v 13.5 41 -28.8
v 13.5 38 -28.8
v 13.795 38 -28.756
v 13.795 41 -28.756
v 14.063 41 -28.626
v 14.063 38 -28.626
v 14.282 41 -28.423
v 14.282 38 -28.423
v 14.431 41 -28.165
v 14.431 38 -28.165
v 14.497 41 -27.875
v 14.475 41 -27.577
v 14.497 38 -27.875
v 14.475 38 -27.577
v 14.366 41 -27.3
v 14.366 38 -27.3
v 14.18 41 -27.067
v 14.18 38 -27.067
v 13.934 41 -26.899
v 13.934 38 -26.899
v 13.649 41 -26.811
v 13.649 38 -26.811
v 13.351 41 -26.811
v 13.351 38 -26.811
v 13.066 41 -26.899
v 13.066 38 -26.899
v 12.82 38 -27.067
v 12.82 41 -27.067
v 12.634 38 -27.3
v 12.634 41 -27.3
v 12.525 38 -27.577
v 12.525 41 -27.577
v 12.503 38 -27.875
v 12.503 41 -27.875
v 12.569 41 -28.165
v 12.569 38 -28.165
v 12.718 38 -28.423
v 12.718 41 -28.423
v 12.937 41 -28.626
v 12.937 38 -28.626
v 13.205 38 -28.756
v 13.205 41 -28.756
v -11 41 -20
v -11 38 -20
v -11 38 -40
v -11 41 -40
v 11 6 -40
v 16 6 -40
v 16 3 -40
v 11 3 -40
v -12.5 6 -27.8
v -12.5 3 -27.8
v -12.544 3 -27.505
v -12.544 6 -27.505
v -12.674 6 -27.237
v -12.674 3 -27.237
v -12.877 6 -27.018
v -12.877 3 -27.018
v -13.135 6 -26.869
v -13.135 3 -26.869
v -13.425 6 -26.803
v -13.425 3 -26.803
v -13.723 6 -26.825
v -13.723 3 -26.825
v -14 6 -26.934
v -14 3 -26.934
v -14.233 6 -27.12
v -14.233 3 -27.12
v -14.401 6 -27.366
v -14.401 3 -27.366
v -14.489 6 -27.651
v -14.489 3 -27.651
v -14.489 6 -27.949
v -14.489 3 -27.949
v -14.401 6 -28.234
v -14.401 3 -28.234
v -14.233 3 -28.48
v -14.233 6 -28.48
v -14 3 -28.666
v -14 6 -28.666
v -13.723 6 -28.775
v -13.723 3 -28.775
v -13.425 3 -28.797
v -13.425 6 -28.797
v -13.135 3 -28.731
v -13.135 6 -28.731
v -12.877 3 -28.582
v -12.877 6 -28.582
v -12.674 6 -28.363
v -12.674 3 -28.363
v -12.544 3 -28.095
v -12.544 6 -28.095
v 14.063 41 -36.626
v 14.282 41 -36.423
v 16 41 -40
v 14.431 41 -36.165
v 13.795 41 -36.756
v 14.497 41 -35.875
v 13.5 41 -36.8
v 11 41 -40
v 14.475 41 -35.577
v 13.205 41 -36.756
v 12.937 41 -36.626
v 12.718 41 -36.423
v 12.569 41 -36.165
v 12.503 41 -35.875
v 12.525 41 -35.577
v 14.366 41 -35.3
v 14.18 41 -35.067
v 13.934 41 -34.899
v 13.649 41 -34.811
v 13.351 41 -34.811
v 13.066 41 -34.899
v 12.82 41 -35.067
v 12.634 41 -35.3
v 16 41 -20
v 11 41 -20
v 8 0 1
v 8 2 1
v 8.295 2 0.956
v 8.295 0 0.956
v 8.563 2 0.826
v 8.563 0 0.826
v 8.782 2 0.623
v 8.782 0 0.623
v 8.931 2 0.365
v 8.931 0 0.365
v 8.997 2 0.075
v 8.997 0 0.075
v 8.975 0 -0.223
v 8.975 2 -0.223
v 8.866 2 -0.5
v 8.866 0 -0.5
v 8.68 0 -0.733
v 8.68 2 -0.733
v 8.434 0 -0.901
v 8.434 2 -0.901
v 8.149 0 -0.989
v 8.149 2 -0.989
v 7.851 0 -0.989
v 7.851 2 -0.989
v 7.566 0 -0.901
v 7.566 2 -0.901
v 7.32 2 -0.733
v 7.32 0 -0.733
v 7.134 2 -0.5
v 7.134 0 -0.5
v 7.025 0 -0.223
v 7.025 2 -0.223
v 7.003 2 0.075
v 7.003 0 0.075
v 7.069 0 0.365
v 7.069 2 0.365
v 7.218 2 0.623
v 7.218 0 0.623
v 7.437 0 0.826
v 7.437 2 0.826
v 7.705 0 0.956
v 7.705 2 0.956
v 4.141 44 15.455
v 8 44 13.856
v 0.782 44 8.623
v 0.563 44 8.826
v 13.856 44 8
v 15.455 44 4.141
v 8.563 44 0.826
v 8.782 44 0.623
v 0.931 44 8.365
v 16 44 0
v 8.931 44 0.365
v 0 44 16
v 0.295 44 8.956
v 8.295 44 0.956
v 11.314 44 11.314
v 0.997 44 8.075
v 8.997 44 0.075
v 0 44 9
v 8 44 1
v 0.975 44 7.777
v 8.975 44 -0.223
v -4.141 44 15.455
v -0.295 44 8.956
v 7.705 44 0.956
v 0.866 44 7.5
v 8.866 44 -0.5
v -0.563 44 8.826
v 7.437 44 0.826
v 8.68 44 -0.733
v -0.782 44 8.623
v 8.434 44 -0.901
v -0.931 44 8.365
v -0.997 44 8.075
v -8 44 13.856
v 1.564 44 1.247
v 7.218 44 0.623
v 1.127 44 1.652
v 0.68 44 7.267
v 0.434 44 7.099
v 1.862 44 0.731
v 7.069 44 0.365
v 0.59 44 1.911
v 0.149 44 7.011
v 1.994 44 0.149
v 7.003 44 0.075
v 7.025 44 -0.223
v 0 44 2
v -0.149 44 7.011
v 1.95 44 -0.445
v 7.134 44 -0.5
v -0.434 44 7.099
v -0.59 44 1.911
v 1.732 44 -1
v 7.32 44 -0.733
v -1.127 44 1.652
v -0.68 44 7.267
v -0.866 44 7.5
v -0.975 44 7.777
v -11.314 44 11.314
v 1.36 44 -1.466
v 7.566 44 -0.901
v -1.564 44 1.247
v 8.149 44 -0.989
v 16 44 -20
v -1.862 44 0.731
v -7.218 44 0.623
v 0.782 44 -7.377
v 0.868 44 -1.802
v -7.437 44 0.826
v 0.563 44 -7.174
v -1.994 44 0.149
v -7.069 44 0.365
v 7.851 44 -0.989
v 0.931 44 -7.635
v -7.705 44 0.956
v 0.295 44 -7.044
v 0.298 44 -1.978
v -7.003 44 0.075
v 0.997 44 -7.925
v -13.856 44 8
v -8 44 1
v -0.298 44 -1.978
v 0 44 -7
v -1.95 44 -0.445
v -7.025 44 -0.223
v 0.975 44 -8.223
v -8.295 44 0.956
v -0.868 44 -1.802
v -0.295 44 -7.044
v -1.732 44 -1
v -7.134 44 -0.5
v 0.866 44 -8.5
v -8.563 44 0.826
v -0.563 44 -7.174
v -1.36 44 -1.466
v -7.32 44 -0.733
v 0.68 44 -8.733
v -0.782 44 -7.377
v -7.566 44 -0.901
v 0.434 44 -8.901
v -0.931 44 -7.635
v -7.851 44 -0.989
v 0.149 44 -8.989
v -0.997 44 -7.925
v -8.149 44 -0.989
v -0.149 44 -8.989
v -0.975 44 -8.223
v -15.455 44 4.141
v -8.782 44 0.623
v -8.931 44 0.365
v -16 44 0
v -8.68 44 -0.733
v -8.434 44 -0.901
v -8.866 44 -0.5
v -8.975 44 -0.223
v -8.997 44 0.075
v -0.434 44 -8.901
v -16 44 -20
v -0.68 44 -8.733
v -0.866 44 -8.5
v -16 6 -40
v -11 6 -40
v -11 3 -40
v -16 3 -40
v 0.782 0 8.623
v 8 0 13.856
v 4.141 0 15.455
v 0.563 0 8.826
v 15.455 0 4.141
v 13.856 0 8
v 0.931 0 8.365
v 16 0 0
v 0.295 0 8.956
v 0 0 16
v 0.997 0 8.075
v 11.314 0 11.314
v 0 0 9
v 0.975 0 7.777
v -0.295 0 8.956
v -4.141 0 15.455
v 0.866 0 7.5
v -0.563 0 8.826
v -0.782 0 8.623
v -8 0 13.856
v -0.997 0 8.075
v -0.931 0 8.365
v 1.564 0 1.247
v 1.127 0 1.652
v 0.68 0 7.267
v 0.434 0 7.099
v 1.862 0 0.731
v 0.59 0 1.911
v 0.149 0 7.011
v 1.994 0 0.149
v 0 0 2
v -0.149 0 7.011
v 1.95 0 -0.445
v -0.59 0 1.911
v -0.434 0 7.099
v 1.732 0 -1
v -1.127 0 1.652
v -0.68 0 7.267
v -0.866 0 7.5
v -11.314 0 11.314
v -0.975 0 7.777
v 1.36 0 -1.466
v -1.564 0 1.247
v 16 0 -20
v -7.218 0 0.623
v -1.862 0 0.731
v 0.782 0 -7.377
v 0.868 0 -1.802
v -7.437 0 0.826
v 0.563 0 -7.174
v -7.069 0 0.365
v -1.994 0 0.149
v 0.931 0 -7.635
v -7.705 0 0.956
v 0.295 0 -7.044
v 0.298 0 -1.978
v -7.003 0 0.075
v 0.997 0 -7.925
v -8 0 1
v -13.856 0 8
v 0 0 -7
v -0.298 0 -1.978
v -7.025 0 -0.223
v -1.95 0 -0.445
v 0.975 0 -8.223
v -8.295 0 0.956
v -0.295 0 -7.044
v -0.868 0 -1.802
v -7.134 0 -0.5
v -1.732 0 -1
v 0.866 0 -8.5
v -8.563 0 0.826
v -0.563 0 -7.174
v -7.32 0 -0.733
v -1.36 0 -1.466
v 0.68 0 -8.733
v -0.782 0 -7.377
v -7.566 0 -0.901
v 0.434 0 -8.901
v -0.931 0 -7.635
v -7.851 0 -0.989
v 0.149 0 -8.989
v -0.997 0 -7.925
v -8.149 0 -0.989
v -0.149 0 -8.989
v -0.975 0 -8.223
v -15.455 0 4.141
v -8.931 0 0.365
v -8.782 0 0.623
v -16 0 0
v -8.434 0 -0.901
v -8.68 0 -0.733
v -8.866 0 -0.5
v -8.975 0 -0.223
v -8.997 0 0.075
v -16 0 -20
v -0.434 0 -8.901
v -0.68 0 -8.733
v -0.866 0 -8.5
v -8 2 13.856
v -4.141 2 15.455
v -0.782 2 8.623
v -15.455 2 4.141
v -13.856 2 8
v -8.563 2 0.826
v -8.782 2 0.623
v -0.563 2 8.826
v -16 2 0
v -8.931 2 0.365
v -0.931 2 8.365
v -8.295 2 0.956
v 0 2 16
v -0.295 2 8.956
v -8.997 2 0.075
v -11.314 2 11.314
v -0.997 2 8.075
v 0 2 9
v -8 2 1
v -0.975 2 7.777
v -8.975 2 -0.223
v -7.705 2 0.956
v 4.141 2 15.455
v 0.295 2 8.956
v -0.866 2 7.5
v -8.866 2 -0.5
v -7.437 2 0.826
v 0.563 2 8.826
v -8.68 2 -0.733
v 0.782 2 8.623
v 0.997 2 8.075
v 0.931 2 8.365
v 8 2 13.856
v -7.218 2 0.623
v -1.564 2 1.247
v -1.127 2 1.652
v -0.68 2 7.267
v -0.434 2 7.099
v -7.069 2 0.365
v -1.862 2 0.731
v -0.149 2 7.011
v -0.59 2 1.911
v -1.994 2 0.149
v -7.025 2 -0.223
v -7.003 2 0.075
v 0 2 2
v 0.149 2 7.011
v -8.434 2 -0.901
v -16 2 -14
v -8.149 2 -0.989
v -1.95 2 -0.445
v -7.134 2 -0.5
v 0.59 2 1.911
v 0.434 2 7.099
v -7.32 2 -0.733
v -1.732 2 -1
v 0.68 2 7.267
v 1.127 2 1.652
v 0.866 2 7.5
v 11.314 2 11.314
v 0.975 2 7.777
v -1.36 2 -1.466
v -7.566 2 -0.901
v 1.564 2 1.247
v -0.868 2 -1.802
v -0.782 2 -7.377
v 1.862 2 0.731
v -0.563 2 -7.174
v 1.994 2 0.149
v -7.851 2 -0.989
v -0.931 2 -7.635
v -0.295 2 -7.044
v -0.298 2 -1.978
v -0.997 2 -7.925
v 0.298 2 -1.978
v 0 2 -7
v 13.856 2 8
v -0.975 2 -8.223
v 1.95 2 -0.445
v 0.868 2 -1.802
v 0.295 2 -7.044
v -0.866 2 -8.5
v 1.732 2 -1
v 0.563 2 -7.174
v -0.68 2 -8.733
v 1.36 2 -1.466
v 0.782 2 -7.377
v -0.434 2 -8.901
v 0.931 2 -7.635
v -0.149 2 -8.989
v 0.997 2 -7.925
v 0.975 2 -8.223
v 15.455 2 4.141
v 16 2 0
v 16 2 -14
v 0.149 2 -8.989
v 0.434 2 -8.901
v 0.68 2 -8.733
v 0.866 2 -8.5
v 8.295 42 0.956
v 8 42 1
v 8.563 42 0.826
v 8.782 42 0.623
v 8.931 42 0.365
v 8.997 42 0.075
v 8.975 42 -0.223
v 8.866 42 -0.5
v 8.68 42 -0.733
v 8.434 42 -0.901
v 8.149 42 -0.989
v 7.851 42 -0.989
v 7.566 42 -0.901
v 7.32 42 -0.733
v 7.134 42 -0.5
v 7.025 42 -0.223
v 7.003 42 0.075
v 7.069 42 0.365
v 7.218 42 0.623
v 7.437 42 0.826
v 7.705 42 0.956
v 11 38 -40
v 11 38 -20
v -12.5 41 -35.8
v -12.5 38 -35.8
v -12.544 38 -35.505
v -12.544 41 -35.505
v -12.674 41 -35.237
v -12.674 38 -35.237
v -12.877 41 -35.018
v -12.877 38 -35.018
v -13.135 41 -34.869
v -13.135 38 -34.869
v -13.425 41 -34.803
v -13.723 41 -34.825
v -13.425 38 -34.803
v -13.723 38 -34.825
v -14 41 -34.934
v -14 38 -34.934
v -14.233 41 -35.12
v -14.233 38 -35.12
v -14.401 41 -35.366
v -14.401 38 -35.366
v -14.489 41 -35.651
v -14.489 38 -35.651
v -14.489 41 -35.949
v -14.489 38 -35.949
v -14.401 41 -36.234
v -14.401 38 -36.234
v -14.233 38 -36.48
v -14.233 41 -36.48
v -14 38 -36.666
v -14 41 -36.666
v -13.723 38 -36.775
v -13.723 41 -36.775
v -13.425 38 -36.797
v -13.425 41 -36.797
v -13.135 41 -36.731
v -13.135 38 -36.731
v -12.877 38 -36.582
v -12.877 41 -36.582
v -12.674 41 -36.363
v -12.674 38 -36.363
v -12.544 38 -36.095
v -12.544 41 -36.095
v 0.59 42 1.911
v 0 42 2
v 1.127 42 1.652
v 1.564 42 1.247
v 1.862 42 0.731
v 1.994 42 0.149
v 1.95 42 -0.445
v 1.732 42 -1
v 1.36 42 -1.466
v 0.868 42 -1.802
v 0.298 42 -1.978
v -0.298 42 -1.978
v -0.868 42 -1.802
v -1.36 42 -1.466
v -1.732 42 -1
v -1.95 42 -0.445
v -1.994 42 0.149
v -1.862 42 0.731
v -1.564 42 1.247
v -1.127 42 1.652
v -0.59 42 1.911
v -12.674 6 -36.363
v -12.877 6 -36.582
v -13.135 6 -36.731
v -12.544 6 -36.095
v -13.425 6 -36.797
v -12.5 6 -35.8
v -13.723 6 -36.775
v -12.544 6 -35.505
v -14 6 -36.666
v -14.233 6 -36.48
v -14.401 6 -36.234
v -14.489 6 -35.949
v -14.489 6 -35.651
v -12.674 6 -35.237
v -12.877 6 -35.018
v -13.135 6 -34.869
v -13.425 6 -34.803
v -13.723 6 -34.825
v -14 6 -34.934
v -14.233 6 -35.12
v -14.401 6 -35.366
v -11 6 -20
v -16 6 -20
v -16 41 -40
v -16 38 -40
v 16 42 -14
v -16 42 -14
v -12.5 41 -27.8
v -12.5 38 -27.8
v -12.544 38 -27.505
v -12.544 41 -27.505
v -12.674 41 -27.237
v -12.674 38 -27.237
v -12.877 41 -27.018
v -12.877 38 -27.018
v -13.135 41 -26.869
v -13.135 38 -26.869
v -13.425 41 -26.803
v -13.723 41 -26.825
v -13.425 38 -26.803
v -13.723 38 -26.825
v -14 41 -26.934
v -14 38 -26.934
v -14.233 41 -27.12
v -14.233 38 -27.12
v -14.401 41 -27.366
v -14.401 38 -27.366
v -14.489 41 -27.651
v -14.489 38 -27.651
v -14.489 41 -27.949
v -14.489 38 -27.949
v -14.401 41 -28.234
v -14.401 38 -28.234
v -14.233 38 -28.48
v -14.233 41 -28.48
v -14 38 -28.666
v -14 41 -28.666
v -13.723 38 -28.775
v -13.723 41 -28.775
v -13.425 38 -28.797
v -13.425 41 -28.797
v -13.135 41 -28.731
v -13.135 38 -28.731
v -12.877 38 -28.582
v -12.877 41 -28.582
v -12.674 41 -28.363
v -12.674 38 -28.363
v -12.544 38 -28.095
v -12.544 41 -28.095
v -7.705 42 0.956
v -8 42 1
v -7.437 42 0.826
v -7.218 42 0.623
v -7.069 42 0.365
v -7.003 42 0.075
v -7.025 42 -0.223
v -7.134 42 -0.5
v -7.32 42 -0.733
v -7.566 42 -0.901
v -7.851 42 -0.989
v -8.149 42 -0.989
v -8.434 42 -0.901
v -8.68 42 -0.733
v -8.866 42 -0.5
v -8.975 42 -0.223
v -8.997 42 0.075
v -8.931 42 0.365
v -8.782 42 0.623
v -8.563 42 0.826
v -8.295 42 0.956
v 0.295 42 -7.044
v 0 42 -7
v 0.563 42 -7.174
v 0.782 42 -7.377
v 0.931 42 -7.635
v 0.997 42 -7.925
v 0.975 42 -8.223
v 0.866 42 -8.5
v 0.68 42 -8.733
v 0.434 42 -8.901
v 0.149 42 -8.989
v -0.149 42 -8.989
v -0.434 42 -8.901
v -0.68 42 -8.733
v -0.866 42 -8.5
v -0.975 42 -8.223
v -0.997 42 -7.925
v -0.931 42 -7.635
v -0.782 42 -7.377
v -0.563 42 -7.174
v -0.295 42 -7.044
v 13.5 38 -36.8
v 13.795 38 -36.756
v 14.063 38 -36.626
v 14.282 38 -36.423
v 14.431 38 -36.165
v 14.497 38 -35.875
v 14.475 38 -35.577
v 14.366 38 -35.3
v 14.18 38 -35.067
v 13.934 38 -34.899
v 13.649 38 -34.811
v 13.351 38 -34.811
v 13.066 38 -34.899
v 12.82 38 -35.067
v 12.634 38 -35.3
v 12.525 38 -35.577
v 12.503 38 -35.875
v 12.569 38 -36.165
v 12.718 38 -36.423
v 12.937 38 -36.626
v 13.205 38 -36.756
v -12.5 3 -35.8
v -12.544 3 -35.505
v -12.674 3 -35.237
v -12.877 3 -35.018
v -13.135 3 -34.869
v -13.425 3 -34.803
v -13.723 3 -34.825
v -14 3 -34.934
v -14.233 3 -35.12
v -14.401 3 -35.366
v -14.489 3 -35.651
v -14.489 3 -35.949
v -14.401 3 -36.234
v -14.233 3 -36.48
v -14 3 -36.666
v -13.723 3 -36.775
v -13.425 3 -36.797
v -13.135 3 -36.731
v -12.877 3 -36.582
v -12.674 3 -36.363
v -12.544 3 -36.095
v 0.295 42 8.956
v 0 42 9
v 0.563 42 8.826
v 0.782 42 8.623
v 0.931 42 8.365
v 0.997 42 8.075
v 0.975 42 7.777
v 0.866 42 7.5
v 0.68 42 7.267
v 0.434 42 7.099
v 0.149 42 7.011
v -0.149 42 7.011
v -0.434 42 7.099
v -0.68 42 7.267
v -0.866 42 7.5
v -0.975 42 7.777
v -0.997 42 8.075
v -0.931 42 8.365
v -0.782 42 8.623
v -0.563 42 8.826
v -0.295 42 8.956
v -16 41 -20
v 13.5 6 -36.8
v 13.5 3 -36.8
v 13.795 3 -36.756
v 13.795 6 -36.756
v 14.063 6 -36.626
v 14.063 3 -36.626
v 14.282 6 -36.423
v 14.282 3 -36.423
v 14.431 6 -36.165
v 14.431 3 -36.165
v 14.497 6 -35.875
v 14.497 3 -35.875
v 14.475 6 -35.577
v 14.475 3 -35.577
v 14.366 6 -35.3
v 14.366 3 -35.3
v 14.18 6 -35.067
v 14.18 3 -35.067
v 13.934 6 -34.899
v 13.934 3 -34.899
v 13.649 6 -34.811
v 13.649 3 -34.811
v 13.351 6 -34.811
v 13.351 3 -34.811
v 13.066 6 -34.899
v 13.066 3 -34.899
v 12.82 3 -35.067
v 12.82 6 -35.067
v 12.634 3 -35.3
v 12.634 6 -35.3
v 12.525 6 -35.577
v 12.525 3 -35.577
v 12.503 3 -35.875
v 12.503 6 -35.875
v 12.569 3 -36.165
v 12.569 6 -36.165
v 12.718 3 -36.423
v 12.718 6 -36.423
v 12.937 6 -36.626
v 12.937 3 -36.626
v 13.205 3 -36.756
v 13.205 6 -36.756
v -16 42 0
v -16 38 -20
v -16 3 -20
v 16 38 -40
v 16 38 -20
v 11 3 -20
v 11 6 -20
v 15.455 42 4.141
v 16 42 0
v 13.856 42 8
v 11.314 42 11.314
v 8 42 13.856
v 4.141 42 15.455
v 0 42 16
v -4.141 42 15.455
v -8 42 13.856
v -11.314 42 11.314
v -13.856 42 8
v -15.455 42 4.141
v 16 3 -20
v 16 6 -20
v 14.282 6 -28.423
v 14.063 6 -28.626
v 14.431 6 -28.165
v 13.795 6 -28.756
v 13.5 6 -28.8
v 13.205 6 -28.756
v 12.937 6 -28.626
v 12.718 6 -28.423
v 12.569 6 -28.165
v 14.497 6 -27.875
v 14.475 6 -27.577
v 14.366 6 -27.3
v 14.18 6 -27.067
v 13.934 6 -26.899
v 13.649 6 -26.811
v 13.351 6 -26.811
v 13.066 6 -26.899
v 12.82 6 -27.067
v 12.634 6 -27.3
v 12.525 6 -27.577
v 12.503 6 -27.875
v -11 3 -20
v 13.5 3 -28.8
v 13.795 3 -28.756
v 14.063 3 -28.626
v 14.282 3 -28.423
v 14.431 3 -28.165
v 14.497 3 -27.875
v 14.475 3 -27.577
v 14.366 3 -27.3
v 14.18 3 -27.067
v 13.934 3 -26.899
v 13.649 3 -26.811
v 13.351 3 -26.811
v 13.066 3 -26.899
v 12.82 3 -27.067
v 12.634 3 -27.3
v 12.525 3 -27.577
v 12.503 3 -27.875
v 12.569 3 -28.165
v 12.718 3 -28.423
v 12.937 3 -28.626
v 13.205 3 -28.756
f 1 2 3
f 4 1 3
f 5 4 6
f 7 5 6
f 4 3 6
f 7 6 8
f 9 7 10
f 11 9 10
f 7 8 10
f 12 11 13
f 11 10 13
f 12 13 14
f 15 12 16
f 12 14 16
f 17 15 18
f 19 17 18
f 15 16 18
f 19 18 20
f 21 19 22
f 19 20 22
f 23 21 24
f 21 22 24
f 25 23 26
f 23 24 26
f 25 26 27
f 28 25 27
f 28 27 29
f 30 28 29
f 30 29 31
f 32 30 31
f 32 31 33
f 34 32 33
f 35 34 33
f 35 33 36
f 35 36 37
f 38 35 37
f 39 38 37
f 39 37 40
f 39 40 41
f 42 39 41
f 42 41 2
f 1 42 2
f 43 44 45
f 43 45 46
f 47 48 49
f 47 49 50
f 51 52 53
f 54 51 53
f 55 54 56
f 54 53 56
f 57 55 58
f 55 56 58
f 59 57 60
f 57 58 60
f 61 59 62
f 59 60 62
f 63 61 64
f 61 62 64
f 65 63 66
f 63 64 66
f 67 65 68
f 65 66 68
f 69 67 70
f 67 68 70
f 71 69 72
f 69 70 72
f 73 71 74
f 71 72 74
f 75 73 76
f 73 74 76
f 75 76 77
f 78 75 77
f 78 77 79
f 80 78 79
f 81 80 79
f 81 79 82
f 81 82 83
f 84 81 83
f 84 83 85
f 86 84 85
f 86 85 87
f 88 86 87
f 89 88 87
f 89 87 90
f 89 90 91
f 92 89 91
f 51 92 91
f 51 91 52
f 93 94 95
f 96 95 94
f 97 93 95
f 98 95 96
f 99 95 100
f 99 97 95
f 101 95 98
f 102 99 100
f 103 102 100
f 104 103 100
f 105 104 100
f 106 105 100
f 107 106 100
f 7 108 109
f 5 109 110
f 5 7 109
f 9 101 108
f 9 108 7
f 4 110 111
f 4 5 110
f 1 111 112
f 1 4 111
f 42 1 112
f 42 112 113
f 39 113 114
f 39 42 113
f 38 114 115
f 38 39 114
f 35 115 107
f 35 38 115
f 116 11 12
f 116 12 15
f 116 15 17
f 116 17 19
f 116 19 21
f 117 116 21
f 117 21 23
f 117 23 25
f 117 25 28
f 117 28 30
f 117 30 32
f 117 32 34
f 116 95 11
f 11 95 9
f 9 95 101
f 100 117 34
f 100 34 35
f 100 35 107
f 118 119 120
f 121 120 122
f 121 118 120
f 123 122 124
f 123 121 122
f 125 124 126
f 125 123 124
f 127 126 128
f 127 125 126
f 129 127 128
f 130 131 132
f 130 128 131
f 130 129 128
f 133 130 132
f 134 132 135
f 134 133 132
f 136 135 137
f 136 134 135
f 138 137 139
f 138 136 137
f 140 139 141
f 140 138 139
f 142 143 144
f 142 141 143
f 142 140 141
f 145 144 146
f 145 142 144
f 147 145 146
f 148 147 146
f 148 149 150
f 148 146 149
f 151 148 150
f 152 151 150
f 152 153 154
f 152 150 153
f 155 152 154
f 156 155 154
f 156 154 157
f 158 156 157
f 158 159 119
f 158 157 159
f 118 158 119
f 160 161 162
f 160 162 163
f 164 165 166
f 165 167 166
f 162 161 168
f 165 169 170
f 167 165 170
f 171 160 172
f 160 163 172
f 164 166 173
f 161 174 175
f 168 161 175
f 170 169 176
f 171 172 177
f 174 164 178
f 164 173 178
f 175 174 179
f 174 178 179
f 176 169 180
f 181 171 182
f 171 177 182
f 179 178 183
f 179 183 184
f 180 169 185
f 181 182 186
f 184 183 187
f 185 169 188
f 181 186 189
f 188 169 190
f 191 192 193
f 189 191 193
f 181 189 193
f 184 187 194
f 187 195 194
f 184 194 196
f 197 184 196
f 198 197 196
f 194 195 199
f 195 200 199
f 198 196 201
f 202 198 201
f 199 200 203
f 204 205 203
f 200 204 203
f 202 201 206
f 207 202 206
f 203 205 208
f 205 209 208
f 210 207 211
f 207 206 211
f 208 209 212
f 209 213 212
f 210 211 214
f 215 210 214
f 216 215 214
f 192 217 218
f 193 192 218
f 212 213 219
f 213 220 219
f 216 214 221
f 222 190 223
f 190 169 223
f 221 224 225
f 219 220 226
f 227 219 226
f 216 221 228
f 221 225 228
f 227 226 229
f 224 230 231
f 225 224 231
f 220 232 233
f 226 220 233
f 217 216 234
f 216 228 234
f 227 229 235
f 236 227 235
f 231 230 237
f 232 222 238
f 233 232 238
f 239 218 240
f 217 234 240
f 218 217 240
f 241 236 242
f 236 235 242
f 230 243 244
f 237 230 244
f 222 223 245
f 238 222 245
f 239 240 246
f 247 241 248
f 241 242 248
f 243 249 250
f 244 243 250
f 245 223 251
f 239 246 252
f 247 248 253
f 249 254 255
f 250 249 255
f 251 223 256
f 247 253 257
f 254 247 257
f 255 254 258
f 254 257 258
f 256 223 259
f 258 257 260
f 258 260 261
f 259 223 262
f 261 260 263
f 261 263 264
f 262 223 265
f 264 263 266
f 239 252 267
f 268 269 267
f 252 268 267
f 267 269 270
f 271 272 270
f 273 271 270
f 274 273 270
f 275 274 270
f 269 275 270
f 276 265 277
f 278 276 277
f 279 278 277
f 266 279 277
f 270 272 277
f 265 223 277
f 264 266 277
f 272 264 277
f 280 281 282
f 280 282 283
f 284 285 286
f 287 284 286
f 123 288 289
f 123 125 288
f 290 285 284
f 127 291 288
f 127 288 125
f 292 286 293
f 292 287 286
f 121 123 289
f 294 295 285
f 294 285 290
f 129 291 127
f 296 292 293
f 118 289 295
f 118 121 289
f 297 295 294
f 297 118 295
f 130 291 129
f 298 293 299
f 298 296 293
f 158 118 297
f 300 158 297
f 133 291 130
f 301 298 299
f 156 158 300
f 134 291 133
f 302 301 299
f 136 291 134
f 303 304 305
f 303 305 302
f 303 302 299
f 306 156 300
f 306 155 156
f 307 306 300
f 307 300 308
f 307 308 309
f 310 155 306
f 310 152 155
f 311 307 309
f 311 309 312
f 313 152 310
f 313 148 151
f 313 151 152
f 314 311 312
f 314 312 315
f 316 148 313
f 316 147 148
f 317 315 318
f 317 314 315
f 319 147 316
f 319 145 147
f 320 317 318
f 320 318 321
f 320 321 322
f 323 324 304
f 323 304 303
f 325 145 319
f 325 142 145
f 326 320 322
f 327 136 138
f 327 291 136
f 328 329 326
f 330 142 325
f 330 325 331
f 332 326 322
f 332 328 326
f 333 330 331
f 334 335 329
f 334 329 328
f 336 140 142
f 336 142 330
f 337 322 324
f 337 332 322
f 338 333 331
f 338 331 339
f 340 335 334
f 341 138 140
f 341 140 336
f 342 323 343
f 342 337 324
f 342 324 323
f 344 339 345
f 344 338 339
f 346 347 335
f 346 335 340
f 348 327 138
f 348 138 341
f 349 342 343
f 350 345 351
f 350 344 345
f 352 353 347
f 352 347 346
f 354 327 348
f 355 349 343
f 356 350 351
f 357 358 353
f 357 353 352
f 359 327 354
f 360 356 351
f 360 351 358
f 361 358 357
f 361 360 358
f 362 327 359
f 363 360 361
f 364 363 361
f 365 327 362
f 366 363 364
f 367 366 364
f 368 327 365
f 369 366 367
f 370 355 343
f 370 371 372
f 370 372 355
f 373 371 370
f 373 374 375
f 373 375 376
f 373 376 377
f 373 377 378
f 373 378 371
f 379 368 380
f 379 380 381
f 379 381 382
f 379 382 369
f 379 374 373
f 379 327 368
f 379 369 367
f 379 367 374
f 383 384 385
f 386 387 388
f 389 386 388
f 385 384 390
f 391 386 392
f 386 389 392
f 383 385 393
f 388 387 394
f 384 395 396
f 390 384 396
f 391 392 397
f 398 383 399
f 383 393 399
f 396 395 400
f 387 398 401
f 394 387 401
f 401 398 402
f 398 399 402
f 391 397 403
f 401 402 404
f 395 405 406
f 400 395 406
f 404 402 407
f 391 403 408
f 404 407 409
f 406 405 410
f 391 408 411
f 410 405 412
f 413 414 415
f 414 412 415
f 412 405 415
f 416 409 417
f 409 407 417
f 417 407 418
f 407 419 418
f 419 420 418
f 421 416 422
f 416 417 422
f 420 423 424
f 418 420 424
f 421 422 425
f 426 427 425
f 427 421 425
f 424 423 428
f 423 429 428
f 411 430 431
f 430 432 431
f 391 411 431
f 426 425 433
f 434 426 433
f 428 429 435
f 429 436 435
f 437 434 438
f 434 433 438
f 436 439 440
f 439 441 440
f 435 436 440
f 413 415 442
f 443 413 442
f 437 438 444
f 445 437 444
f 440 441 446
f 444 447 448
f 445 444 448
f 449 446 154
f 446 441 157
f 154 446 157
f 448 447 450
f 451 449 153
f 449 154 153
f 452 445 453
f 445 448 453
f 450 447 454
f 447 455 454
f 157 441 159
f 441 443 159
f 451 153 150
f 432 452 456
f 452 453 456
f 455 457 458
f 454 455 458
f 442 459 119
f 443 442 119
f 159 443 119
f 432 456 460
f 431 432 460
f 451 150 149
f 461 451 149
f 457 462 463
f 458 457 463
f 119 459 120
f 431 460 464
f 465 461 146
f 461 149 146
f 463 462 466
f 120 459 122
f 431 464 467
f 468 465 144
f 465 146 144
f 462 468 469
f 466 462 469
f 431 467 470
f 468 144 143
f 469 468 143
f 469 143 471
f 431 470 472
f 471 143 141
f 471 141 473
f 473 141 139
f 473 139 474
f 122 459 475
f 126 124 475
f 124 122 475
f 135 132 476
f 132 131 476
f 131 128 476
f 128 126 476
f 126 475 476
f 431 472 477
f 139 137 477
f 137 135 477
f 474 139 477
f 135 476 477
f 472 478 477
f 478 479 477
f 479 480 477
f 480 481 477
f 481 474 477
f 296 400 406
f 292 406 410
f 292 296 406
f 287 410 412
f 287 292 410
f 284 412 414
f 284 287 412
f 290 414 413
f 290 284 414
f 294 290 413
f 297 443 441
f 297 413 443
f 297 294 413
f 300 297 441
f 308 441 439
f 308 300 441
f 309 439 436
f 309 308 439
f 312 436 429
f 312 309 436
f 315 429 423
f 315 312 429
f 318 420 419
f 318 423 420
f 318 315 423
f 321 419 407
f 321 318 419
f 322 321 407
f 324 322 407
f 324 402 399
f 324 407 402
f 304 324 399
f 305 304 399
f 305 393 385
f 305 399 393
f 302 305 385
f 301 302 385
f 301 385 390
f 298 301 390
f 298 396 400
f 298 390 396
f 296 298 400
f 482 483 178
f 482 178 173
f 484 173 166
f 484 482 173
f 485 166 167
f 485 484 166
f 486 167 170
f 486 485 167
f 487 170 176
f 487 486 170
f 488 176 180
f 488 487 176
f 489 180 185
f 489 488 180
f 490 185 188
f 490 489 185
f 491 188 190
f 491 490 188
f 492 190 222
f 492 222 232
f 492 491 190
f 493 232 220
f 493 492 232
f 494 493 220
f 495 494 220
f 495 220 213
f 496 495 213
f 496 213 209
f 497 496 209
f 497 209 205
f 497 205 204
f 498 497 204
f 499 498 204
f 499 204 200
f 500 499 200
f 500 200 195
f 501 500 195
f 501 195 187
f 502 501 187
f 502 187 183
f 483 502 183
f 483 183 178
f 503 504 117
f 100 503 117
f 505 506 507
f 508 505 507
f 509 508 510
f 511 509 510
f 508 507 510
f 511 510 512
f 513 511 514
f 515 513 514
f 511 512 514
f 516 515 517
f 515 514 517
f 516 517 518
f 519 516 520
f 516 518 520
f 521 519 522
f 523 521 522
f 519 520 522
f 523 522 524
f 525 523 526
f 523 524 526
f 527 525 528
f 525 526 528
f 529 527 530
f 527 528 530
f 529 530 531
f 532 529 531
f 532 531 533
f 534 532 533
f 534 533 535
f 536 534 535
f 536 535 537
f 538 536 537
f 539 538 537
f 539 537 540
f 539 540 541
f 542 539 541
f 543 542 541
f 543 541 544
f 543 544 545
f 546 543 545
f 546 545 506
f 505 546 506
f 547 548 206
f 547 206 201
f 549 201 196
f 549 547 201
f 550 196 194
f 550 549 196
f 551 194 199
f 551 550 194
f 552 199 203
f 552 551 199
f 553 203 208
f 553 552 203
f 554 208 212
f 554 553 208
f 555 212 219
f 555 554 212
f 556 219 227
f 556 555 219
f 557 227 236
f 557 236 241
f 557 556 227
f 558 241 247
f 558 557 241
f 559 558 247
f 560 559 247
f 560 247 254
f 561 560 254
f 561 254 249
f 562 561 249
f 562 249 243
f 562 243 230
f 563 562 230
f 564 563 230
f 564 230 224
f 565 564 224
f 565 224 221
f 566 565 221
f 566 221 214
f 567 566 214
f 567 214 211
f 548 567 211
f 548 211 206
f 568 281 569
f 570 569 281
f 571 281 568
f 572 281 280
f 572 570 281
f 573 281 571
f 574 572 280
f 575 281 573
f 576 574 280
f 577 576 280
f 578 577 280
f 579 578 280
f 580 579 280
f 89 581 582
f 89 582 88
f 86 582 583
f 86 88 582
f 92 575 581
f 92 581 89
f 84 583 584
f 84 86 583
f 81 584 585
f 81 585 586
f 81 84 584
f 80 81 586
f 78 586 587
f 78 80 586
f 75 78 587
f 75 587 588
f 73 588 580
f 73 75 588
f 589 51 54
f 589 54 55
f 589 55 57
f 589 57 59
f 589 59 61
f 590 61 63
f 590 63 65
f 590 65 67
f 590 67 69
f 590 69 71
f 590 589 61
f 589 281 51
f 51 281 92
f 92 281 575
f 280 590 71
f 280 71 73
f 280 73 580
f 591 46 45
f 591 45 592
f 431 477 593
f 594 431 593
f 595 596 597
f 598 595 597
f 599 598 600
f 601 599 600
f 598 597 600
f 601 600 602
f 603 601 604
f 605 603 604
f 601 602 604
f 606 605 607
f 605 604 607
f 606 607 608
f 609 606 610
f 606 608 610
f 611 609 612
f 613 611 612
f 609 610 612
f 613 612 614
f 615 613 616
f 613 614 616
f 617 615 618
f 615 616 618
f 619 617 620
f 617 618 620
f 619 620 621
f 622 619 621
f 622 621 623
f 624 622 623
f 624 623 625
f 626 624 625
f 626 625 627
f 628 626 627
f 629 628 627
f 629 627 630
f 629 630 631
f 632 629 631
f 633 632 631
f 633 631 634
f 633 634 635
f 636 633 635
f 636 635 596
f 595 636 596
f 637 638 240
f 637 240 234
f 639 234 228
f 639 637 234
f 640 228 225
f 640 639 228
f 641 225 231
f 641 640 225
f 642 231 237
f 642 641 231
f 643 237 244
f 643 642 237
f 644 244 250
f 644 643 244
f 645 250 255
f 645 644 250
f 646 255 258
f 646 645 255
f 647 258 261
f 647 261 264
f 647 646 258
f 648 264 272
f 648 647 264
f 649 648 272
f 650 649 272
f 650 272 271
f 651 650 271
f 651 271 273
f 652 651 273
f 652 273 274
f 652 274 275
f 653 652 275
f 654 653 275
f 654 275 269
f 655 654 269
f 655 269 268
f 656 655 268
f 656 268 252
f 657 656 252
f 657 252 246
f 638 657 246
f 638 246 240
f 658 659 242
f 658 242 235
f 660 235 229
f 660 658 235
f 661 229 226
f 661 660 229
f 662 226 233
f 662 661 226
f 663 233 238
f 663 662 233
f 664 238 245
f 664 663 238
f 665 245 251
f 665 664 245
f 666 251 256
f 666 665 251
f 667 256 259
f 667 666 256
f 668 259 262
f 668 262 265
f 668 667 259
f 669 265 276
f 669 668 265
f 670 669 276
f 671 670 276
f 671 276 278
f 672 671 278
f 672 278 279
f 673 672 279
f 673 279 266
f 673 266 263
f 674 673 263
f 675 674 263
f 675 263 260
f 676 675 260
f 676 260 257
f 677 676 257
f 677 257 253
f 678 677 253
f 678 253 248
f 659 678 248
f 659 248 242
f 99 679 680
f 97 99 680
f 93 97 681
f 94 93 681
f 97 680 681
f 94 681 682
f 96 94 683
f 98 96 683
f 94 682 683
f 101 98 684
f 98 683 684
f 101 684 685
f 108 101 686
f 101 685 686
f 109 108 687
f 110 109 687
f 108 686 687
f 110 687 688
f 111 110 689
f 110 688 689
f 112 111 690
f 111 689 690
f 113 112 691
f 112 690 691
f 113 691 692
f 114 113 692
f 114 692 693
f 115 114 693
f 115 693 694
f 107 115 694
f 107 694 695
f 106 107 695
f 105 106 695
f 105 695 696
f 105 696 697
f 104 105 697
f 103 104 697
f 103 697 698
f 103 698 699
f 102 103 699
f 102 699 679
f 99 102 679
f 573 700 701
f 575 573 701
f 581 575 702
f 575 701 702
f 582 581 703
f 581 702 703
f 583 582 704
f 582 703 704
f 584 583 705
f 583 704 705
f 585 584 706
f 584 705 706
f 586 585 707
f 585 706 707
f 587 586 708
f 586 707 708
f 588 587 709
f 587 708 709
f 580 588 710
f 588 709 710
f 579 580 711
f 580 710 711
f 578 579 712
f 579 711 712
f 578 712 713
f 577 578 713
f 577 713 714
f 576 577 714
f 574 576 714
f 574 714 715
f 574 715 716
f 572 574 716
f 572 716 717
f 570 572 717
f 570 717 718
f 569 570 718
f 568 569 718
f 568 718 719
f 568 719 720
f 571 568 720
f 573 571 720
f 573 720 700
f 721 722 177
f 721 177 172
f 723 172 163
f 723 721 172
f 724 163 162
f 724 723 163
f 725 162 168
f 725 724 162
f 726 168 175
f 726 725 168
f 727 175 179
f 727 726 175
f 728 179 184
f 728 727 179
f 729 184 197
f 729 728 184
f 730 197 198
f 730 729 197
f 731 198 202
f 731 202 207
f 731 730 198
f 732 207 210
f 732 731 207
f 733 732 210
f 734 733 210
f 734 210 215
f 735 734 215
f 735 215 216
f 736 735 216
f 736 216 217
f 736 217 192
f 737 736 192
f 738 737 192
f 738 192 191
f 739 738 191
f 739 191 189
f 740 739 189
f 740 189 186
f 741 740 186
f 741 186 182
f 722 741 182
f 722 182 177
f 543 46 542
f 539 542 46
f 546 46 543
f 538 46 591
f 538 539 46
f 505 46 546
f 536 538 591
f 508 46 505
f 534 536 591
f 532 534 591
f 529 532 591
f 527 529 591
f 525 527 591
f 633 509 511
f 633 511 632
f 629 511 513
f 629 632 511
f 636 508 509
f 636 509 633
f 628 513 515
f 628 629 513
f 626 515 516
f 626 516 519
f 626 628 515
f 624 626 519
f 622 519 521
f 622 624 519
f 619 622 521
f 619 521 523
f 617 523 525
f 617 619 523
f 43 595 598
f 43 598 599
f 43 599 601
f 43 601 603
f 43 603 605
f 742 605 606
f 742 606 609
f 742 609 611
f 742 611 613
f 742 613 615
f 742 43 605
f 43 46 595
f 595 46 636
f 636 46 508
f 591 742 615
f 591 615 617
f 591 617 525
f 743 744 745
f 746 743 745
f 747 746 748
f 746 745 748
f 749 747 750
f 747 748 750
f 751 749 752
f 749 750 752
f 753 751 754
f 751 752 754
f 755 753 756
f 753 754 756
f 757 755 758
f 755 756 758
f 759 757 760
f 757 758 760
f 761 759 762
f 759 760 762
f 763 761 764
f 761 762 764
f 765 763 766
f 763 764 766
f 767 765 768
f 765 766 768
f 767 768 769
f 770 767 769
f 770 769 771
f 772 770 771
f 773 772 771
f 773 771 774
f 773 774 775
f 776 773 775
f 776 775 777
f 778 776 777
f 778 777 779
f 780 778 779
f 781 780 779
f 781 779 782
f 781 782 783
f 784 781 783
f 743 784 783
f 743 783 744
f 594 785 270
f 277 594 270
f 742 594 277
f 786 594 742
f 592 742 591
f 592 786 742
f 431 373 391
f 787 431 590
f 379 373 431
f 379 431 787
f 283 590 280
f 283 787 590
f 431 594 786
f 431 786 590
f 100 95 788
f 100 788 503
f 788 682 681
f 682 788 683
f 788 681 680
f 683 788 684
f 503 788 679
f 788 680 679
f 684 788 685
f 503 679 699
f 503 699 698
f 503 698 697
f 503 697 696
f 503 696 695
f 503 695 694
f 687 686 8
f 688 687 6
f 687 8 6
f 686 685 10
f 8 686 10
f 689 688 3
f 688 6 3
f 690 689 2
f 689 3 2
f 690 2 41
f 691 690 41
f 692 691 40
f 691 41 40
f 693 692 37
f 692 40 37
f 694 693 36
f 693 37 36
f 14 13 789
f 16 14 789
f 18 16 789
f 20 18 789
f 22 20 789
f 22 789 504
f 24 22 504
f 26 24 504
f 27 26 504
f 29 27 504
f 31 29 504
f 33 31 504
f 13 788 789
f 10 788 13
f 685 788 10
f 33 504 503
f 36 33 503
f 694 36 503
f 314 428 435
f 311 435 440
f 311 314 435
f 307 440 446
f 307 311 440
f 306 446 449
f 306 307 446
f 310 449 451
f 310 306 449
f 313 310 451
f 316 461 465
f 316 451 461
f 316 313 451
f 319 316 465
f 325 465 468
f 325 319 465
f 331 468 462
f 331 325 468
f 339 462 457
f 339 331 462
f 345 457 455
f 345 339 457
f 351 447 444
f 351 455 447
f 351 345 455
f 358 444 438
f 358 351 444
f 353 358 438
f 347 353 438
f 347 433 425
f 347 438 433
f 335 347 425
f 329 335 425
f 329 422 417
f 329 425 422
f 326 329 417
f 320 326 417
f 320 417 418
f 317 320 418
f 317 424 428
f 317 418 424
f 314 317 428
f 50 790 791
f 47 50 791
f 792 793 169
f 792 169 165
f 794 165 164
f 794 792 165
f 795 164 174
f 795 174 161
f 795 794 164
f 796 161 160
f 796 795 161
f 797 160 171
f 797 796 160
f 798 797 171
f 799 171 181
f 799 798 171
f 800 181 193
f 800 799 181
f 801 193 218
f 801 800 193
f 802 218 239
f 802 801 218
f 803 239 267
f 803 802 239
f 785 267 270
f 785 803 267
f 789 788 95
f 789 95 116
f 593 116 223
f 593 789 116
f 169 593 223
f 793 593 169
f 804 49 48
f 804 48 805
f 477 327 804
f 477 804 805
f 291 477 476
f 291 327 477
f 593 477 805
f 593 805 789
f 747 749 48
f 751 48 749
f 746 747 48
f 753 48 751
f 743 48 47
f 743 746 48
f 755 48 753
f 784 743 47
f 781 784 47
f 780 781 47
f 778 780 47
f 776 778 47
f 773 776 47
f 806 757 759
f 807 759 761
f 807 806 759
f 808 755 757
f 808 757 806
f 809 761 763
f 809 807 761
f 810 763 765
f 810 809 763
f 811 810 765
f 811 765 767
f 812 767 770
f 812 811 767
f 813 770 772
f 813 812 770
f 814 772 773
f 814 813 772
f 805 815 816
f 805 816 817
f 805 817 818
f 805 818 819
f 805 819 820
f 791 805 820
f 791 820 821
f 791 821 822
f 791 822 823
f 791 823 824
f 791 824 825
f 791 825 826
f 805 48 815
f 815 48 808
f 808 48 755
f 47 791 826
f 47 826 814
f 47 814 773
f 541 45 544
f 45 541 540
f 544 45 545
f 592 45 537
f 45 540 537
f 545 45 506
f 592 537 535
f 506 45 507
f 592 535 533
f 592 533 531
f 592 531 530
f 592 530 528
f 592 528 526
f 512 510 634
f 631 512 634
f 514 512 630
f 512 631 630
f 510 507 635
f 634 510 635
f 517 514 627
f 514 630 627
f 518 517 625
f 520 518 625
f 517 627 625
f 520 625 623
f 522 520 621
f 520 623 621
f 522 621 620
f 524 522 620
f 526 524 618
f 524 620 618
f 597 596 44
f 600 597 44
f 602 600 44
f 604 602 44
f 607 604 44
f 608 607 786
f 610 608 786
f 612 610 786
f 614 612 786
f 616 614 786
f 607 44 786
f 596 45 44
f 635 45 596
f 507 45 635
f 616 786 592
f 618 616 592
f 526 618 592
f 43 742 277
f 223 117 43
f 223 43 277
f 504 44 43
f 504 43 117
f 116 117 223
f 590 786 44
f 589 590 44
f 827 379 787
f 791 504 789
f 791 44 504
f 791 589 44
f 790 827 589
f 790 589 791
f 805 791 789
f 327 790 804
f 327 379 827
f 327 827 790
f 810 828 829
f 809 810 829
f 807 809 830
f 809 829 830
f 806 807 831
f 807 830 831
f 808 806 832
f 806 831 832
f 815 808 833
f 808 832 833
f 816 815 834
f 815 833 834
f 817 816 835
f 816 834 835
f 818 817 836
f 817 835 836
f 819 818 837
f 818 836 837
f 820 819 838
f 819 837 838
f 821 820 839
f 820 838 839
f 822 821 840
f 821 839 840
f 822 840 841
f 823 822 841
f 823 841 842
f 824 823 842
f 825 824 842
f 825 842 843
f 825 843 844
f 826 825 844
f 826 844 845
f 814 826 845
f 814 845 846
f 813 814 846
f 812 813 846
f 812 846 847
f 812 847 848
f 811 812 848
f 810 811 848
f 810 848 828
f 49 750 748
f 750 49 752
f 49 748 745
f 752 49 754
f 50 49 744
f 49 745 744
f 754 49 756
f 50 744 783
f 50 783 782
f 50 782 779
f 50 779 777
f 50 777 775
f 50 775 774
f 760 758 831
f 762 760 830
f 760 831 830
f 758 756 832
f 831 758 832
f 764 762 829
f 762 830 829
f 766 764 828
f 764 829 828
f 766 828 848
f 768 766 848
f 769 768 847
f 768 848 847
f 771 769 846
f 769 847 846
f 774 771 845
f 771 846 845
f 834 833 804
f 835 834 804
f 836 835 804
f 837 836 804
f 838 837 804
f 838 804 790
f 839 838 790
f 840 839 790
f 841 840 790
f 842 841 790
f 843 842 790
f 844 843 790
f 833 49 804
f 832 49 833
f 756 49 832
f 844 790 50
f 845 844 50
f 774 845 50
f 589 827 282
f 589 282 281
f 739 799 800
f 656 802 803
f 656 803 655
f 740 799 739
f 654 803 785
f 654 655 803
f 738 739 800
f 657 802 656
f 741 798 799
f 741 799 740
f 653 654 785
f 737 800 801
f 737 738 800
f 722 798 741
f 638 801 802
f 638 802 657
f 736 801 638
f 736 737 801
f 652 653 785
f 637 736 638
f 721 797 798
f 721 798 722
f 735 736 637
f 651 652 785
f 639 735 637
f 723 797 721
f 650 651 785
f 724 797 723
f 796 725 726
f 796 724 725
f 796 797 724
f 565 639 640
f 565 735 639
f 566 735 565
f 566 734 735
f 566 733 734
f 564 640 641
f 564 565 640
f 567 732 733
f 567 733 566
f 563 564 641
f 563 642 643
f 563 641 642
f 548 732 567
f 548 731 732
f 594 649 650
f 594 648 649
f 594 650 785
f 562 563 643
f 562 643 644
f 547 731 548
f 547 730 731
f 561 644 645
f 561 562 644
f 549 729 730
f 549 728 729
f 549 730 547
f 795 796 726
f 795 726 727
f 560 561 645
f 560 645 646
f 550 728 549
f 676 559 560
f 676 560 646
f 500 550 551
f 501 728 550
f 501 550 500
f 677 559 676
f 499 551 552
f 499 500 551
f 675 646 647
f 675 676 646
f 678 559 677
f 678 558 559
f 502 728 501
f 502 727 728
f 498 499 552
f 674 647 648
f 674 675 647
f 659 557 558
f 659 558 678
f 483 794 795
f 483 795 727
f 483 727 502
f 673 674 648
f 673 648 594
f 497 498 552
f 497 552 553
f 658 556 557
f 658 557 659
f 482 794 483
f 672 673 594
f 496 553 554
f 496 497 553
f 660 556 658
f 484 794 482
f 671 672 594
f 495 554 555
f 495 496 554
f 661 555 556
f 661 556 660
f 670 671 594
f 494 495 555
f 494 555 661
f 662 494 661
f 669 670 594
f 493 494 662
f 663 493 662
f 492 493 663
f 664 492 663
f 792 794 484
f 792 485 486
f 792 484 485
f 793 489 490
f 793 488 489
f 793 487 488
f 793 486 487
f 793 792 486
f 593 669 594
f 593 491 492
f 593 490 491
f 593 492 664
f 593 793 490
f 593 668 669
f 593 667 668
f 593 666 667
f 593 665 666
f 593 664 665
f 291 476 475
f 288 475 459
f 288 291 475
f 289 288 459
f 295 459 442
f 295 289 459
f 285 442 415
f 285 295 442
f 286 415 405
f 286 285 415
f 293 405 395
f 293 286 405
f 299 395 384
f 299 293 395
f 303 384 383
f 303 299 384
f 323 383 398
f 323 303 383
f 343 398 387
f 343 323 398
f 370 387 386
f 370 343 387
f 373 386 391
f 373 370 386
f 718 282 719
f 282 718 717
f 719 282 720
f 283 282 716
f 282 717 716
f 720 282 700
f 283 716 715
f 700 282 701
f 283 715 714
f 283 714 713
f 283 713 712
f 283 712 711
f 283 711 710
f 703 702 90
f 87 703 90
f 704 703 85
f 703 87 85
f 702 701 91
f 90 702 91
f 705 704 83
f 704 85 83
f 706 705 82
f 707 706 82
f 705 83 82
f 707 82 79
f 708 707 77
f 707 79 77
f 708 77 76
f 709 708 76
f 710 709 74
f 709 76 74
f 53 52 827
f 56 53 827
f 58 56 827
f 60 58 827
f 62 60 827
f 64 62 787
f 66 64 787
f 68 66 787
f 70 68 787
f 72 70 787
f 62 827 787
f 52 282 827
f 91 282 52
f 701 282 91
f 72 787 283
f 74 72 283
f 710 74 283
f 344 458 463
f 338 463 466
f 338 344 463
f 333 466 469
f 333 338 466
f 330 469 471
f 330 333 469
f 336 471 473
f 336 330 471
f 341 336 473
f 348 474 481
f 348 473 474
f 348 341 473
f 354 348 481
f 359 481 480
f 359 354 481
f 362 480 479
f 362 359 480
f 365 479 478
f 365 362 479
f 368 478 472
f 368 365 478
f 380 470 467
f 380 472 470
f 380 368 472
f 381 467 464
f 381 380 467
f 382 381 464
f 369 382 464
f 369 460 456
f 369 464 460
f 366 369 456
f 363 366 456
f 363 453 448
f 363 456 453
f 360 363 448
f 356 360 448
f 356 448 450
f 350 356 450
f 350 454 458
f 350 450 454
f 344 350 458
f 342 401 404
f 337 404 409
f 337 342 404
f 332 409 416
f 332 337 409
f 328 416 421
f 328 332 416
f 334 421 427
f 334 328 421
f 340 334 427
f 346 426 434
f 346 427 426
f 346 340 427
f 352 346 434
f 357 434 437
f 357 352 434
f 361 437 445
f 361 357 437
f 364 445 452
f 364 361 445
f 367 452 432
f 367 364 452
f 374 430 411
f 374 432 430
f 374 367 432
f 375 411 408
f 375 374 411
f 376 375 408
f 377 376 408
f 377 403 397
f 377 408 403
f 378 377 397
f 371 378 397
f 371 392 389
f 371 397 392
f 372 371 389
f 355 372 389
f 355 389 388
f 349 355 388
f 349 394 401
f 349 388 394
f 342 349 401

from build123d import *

# Parameters (mm, degrees)
SKETCH1_R           = 1
SKETCH1_R_2         = 2
BOSS_EXTRUDE1_DEPTH = 44
SKETCH2_W           = 30
SKETCH2_H           = 40
CUT_EXTRUDE1_DEPTH  = 58.965506985
SKETCH3_W           = 5
SKETCH3_H           = 3
BOSS_EXTRUDE2_DEPTH = 20
SKETCH4_R           = 1
CUT_EXTRUDE2_DEPTH  = 62.579217273


with BuildPart() as part:
    # Sketch1 → Boss-Extrude1 (new body)
    with BuildSketch(Plane(origin=(0, 0, 0), x_dir=(1, 0, 0), z_dir=(0, 1, 0))):
        with BuildLine():
            Line((-16, 0), (-16, 20))
            Line((-16, 20), (16, 20))
            Line((16, 20), (16, 0))
            ThreePointArc((16, 0), (0, -16), (-16, 0))
        make_face()
        with Locations(Location((0, 8, 0), (0, 0, 270))):
            Circle(SKETCH1_R, mode=Mode.SUBTRACT)
        with Locations(Location((8, 0, 0), (0, 0, 270))):
            Circle(SKETCH1_R, mode=Mode.SUBTRACT)
        with Locations(Location((0, -8, 0), (0, 0, 270))):
            Circle(SKETCH1_R, mode=Mode.SUBTRACT)
        with Locations(Location((-8, 0, 0), (0, 0, 270))):
            Circle(SKETCH1_R, mode=Mode.SUBTRACT)
        with Locations(Location((0, 0, 0), (0, 0, 270))):
            Circle(SKETCH1_R_2, mode=Mode.SUBTRACT)
    extrude(amount=BOSS_EXTRUDE1_DEPTH)

    # Sketch2 → Cut-Extrude1 (cut, through all)
    with BuildSketch(Plane(origin=(16, 0, 0), x_dir=(0, 0, -1), z_dir=(1, 0, 0))):
        with Locations((-1, 22)):
            Rectangle(SKETCH2_W, SKETCH2_H)
    extrude(amount=-CUT_EXTRUDE1_DEPTH, mode=Mode.SUBTRACT)

    # Sketch3 → Boss-Extrude2 (add)
    with BuildSketch(Plane(origin=(0, 0, -20), x_dir=(-1, 0, 0), z_dir=(0, 0, -1))):
        with Locations((-13.5, 39.5)):
            Rectangle(SKETCH3_W, SKETCH3_H)
        with Locations((13.5, 39.5)):
            Rectangle(SKETCH3_W, SKETCH3_H)
        with Locations((-13.5, 4.5)):
            Rectangle(SKETCH3_W, SKETCH3_H)
        with Locations((13.5, 4.5)):
            Rectangle(SKETCH3_W, SKETCH3_H)
    extrude(amount=BOSS_EXTRUDE2_DEPTH)

    # Sketch4 → Cut-Extrude2 (cut, through all)
    with BuildSketch(Plane.XZ):
        with Locations((-13.5, -27.8)):
            Circle(SKETCH4_R)
        with Locations((-13.5, -35.8)):
            Circle(SKETCH4_R)
        with Locations(Location((13.5, -27.8, 0), (0, 0, 270))):
            Circle(SKETCH4_R)
        with Locations(Location((13.5, -35.8, 0), (0, 0, 270))):
            Circle(SKETCH4_R)
    extrude(amount=-CUT_EXTRUDE2_DEPTH, mode=Mode.SUBTRACT)


solid = part.part
